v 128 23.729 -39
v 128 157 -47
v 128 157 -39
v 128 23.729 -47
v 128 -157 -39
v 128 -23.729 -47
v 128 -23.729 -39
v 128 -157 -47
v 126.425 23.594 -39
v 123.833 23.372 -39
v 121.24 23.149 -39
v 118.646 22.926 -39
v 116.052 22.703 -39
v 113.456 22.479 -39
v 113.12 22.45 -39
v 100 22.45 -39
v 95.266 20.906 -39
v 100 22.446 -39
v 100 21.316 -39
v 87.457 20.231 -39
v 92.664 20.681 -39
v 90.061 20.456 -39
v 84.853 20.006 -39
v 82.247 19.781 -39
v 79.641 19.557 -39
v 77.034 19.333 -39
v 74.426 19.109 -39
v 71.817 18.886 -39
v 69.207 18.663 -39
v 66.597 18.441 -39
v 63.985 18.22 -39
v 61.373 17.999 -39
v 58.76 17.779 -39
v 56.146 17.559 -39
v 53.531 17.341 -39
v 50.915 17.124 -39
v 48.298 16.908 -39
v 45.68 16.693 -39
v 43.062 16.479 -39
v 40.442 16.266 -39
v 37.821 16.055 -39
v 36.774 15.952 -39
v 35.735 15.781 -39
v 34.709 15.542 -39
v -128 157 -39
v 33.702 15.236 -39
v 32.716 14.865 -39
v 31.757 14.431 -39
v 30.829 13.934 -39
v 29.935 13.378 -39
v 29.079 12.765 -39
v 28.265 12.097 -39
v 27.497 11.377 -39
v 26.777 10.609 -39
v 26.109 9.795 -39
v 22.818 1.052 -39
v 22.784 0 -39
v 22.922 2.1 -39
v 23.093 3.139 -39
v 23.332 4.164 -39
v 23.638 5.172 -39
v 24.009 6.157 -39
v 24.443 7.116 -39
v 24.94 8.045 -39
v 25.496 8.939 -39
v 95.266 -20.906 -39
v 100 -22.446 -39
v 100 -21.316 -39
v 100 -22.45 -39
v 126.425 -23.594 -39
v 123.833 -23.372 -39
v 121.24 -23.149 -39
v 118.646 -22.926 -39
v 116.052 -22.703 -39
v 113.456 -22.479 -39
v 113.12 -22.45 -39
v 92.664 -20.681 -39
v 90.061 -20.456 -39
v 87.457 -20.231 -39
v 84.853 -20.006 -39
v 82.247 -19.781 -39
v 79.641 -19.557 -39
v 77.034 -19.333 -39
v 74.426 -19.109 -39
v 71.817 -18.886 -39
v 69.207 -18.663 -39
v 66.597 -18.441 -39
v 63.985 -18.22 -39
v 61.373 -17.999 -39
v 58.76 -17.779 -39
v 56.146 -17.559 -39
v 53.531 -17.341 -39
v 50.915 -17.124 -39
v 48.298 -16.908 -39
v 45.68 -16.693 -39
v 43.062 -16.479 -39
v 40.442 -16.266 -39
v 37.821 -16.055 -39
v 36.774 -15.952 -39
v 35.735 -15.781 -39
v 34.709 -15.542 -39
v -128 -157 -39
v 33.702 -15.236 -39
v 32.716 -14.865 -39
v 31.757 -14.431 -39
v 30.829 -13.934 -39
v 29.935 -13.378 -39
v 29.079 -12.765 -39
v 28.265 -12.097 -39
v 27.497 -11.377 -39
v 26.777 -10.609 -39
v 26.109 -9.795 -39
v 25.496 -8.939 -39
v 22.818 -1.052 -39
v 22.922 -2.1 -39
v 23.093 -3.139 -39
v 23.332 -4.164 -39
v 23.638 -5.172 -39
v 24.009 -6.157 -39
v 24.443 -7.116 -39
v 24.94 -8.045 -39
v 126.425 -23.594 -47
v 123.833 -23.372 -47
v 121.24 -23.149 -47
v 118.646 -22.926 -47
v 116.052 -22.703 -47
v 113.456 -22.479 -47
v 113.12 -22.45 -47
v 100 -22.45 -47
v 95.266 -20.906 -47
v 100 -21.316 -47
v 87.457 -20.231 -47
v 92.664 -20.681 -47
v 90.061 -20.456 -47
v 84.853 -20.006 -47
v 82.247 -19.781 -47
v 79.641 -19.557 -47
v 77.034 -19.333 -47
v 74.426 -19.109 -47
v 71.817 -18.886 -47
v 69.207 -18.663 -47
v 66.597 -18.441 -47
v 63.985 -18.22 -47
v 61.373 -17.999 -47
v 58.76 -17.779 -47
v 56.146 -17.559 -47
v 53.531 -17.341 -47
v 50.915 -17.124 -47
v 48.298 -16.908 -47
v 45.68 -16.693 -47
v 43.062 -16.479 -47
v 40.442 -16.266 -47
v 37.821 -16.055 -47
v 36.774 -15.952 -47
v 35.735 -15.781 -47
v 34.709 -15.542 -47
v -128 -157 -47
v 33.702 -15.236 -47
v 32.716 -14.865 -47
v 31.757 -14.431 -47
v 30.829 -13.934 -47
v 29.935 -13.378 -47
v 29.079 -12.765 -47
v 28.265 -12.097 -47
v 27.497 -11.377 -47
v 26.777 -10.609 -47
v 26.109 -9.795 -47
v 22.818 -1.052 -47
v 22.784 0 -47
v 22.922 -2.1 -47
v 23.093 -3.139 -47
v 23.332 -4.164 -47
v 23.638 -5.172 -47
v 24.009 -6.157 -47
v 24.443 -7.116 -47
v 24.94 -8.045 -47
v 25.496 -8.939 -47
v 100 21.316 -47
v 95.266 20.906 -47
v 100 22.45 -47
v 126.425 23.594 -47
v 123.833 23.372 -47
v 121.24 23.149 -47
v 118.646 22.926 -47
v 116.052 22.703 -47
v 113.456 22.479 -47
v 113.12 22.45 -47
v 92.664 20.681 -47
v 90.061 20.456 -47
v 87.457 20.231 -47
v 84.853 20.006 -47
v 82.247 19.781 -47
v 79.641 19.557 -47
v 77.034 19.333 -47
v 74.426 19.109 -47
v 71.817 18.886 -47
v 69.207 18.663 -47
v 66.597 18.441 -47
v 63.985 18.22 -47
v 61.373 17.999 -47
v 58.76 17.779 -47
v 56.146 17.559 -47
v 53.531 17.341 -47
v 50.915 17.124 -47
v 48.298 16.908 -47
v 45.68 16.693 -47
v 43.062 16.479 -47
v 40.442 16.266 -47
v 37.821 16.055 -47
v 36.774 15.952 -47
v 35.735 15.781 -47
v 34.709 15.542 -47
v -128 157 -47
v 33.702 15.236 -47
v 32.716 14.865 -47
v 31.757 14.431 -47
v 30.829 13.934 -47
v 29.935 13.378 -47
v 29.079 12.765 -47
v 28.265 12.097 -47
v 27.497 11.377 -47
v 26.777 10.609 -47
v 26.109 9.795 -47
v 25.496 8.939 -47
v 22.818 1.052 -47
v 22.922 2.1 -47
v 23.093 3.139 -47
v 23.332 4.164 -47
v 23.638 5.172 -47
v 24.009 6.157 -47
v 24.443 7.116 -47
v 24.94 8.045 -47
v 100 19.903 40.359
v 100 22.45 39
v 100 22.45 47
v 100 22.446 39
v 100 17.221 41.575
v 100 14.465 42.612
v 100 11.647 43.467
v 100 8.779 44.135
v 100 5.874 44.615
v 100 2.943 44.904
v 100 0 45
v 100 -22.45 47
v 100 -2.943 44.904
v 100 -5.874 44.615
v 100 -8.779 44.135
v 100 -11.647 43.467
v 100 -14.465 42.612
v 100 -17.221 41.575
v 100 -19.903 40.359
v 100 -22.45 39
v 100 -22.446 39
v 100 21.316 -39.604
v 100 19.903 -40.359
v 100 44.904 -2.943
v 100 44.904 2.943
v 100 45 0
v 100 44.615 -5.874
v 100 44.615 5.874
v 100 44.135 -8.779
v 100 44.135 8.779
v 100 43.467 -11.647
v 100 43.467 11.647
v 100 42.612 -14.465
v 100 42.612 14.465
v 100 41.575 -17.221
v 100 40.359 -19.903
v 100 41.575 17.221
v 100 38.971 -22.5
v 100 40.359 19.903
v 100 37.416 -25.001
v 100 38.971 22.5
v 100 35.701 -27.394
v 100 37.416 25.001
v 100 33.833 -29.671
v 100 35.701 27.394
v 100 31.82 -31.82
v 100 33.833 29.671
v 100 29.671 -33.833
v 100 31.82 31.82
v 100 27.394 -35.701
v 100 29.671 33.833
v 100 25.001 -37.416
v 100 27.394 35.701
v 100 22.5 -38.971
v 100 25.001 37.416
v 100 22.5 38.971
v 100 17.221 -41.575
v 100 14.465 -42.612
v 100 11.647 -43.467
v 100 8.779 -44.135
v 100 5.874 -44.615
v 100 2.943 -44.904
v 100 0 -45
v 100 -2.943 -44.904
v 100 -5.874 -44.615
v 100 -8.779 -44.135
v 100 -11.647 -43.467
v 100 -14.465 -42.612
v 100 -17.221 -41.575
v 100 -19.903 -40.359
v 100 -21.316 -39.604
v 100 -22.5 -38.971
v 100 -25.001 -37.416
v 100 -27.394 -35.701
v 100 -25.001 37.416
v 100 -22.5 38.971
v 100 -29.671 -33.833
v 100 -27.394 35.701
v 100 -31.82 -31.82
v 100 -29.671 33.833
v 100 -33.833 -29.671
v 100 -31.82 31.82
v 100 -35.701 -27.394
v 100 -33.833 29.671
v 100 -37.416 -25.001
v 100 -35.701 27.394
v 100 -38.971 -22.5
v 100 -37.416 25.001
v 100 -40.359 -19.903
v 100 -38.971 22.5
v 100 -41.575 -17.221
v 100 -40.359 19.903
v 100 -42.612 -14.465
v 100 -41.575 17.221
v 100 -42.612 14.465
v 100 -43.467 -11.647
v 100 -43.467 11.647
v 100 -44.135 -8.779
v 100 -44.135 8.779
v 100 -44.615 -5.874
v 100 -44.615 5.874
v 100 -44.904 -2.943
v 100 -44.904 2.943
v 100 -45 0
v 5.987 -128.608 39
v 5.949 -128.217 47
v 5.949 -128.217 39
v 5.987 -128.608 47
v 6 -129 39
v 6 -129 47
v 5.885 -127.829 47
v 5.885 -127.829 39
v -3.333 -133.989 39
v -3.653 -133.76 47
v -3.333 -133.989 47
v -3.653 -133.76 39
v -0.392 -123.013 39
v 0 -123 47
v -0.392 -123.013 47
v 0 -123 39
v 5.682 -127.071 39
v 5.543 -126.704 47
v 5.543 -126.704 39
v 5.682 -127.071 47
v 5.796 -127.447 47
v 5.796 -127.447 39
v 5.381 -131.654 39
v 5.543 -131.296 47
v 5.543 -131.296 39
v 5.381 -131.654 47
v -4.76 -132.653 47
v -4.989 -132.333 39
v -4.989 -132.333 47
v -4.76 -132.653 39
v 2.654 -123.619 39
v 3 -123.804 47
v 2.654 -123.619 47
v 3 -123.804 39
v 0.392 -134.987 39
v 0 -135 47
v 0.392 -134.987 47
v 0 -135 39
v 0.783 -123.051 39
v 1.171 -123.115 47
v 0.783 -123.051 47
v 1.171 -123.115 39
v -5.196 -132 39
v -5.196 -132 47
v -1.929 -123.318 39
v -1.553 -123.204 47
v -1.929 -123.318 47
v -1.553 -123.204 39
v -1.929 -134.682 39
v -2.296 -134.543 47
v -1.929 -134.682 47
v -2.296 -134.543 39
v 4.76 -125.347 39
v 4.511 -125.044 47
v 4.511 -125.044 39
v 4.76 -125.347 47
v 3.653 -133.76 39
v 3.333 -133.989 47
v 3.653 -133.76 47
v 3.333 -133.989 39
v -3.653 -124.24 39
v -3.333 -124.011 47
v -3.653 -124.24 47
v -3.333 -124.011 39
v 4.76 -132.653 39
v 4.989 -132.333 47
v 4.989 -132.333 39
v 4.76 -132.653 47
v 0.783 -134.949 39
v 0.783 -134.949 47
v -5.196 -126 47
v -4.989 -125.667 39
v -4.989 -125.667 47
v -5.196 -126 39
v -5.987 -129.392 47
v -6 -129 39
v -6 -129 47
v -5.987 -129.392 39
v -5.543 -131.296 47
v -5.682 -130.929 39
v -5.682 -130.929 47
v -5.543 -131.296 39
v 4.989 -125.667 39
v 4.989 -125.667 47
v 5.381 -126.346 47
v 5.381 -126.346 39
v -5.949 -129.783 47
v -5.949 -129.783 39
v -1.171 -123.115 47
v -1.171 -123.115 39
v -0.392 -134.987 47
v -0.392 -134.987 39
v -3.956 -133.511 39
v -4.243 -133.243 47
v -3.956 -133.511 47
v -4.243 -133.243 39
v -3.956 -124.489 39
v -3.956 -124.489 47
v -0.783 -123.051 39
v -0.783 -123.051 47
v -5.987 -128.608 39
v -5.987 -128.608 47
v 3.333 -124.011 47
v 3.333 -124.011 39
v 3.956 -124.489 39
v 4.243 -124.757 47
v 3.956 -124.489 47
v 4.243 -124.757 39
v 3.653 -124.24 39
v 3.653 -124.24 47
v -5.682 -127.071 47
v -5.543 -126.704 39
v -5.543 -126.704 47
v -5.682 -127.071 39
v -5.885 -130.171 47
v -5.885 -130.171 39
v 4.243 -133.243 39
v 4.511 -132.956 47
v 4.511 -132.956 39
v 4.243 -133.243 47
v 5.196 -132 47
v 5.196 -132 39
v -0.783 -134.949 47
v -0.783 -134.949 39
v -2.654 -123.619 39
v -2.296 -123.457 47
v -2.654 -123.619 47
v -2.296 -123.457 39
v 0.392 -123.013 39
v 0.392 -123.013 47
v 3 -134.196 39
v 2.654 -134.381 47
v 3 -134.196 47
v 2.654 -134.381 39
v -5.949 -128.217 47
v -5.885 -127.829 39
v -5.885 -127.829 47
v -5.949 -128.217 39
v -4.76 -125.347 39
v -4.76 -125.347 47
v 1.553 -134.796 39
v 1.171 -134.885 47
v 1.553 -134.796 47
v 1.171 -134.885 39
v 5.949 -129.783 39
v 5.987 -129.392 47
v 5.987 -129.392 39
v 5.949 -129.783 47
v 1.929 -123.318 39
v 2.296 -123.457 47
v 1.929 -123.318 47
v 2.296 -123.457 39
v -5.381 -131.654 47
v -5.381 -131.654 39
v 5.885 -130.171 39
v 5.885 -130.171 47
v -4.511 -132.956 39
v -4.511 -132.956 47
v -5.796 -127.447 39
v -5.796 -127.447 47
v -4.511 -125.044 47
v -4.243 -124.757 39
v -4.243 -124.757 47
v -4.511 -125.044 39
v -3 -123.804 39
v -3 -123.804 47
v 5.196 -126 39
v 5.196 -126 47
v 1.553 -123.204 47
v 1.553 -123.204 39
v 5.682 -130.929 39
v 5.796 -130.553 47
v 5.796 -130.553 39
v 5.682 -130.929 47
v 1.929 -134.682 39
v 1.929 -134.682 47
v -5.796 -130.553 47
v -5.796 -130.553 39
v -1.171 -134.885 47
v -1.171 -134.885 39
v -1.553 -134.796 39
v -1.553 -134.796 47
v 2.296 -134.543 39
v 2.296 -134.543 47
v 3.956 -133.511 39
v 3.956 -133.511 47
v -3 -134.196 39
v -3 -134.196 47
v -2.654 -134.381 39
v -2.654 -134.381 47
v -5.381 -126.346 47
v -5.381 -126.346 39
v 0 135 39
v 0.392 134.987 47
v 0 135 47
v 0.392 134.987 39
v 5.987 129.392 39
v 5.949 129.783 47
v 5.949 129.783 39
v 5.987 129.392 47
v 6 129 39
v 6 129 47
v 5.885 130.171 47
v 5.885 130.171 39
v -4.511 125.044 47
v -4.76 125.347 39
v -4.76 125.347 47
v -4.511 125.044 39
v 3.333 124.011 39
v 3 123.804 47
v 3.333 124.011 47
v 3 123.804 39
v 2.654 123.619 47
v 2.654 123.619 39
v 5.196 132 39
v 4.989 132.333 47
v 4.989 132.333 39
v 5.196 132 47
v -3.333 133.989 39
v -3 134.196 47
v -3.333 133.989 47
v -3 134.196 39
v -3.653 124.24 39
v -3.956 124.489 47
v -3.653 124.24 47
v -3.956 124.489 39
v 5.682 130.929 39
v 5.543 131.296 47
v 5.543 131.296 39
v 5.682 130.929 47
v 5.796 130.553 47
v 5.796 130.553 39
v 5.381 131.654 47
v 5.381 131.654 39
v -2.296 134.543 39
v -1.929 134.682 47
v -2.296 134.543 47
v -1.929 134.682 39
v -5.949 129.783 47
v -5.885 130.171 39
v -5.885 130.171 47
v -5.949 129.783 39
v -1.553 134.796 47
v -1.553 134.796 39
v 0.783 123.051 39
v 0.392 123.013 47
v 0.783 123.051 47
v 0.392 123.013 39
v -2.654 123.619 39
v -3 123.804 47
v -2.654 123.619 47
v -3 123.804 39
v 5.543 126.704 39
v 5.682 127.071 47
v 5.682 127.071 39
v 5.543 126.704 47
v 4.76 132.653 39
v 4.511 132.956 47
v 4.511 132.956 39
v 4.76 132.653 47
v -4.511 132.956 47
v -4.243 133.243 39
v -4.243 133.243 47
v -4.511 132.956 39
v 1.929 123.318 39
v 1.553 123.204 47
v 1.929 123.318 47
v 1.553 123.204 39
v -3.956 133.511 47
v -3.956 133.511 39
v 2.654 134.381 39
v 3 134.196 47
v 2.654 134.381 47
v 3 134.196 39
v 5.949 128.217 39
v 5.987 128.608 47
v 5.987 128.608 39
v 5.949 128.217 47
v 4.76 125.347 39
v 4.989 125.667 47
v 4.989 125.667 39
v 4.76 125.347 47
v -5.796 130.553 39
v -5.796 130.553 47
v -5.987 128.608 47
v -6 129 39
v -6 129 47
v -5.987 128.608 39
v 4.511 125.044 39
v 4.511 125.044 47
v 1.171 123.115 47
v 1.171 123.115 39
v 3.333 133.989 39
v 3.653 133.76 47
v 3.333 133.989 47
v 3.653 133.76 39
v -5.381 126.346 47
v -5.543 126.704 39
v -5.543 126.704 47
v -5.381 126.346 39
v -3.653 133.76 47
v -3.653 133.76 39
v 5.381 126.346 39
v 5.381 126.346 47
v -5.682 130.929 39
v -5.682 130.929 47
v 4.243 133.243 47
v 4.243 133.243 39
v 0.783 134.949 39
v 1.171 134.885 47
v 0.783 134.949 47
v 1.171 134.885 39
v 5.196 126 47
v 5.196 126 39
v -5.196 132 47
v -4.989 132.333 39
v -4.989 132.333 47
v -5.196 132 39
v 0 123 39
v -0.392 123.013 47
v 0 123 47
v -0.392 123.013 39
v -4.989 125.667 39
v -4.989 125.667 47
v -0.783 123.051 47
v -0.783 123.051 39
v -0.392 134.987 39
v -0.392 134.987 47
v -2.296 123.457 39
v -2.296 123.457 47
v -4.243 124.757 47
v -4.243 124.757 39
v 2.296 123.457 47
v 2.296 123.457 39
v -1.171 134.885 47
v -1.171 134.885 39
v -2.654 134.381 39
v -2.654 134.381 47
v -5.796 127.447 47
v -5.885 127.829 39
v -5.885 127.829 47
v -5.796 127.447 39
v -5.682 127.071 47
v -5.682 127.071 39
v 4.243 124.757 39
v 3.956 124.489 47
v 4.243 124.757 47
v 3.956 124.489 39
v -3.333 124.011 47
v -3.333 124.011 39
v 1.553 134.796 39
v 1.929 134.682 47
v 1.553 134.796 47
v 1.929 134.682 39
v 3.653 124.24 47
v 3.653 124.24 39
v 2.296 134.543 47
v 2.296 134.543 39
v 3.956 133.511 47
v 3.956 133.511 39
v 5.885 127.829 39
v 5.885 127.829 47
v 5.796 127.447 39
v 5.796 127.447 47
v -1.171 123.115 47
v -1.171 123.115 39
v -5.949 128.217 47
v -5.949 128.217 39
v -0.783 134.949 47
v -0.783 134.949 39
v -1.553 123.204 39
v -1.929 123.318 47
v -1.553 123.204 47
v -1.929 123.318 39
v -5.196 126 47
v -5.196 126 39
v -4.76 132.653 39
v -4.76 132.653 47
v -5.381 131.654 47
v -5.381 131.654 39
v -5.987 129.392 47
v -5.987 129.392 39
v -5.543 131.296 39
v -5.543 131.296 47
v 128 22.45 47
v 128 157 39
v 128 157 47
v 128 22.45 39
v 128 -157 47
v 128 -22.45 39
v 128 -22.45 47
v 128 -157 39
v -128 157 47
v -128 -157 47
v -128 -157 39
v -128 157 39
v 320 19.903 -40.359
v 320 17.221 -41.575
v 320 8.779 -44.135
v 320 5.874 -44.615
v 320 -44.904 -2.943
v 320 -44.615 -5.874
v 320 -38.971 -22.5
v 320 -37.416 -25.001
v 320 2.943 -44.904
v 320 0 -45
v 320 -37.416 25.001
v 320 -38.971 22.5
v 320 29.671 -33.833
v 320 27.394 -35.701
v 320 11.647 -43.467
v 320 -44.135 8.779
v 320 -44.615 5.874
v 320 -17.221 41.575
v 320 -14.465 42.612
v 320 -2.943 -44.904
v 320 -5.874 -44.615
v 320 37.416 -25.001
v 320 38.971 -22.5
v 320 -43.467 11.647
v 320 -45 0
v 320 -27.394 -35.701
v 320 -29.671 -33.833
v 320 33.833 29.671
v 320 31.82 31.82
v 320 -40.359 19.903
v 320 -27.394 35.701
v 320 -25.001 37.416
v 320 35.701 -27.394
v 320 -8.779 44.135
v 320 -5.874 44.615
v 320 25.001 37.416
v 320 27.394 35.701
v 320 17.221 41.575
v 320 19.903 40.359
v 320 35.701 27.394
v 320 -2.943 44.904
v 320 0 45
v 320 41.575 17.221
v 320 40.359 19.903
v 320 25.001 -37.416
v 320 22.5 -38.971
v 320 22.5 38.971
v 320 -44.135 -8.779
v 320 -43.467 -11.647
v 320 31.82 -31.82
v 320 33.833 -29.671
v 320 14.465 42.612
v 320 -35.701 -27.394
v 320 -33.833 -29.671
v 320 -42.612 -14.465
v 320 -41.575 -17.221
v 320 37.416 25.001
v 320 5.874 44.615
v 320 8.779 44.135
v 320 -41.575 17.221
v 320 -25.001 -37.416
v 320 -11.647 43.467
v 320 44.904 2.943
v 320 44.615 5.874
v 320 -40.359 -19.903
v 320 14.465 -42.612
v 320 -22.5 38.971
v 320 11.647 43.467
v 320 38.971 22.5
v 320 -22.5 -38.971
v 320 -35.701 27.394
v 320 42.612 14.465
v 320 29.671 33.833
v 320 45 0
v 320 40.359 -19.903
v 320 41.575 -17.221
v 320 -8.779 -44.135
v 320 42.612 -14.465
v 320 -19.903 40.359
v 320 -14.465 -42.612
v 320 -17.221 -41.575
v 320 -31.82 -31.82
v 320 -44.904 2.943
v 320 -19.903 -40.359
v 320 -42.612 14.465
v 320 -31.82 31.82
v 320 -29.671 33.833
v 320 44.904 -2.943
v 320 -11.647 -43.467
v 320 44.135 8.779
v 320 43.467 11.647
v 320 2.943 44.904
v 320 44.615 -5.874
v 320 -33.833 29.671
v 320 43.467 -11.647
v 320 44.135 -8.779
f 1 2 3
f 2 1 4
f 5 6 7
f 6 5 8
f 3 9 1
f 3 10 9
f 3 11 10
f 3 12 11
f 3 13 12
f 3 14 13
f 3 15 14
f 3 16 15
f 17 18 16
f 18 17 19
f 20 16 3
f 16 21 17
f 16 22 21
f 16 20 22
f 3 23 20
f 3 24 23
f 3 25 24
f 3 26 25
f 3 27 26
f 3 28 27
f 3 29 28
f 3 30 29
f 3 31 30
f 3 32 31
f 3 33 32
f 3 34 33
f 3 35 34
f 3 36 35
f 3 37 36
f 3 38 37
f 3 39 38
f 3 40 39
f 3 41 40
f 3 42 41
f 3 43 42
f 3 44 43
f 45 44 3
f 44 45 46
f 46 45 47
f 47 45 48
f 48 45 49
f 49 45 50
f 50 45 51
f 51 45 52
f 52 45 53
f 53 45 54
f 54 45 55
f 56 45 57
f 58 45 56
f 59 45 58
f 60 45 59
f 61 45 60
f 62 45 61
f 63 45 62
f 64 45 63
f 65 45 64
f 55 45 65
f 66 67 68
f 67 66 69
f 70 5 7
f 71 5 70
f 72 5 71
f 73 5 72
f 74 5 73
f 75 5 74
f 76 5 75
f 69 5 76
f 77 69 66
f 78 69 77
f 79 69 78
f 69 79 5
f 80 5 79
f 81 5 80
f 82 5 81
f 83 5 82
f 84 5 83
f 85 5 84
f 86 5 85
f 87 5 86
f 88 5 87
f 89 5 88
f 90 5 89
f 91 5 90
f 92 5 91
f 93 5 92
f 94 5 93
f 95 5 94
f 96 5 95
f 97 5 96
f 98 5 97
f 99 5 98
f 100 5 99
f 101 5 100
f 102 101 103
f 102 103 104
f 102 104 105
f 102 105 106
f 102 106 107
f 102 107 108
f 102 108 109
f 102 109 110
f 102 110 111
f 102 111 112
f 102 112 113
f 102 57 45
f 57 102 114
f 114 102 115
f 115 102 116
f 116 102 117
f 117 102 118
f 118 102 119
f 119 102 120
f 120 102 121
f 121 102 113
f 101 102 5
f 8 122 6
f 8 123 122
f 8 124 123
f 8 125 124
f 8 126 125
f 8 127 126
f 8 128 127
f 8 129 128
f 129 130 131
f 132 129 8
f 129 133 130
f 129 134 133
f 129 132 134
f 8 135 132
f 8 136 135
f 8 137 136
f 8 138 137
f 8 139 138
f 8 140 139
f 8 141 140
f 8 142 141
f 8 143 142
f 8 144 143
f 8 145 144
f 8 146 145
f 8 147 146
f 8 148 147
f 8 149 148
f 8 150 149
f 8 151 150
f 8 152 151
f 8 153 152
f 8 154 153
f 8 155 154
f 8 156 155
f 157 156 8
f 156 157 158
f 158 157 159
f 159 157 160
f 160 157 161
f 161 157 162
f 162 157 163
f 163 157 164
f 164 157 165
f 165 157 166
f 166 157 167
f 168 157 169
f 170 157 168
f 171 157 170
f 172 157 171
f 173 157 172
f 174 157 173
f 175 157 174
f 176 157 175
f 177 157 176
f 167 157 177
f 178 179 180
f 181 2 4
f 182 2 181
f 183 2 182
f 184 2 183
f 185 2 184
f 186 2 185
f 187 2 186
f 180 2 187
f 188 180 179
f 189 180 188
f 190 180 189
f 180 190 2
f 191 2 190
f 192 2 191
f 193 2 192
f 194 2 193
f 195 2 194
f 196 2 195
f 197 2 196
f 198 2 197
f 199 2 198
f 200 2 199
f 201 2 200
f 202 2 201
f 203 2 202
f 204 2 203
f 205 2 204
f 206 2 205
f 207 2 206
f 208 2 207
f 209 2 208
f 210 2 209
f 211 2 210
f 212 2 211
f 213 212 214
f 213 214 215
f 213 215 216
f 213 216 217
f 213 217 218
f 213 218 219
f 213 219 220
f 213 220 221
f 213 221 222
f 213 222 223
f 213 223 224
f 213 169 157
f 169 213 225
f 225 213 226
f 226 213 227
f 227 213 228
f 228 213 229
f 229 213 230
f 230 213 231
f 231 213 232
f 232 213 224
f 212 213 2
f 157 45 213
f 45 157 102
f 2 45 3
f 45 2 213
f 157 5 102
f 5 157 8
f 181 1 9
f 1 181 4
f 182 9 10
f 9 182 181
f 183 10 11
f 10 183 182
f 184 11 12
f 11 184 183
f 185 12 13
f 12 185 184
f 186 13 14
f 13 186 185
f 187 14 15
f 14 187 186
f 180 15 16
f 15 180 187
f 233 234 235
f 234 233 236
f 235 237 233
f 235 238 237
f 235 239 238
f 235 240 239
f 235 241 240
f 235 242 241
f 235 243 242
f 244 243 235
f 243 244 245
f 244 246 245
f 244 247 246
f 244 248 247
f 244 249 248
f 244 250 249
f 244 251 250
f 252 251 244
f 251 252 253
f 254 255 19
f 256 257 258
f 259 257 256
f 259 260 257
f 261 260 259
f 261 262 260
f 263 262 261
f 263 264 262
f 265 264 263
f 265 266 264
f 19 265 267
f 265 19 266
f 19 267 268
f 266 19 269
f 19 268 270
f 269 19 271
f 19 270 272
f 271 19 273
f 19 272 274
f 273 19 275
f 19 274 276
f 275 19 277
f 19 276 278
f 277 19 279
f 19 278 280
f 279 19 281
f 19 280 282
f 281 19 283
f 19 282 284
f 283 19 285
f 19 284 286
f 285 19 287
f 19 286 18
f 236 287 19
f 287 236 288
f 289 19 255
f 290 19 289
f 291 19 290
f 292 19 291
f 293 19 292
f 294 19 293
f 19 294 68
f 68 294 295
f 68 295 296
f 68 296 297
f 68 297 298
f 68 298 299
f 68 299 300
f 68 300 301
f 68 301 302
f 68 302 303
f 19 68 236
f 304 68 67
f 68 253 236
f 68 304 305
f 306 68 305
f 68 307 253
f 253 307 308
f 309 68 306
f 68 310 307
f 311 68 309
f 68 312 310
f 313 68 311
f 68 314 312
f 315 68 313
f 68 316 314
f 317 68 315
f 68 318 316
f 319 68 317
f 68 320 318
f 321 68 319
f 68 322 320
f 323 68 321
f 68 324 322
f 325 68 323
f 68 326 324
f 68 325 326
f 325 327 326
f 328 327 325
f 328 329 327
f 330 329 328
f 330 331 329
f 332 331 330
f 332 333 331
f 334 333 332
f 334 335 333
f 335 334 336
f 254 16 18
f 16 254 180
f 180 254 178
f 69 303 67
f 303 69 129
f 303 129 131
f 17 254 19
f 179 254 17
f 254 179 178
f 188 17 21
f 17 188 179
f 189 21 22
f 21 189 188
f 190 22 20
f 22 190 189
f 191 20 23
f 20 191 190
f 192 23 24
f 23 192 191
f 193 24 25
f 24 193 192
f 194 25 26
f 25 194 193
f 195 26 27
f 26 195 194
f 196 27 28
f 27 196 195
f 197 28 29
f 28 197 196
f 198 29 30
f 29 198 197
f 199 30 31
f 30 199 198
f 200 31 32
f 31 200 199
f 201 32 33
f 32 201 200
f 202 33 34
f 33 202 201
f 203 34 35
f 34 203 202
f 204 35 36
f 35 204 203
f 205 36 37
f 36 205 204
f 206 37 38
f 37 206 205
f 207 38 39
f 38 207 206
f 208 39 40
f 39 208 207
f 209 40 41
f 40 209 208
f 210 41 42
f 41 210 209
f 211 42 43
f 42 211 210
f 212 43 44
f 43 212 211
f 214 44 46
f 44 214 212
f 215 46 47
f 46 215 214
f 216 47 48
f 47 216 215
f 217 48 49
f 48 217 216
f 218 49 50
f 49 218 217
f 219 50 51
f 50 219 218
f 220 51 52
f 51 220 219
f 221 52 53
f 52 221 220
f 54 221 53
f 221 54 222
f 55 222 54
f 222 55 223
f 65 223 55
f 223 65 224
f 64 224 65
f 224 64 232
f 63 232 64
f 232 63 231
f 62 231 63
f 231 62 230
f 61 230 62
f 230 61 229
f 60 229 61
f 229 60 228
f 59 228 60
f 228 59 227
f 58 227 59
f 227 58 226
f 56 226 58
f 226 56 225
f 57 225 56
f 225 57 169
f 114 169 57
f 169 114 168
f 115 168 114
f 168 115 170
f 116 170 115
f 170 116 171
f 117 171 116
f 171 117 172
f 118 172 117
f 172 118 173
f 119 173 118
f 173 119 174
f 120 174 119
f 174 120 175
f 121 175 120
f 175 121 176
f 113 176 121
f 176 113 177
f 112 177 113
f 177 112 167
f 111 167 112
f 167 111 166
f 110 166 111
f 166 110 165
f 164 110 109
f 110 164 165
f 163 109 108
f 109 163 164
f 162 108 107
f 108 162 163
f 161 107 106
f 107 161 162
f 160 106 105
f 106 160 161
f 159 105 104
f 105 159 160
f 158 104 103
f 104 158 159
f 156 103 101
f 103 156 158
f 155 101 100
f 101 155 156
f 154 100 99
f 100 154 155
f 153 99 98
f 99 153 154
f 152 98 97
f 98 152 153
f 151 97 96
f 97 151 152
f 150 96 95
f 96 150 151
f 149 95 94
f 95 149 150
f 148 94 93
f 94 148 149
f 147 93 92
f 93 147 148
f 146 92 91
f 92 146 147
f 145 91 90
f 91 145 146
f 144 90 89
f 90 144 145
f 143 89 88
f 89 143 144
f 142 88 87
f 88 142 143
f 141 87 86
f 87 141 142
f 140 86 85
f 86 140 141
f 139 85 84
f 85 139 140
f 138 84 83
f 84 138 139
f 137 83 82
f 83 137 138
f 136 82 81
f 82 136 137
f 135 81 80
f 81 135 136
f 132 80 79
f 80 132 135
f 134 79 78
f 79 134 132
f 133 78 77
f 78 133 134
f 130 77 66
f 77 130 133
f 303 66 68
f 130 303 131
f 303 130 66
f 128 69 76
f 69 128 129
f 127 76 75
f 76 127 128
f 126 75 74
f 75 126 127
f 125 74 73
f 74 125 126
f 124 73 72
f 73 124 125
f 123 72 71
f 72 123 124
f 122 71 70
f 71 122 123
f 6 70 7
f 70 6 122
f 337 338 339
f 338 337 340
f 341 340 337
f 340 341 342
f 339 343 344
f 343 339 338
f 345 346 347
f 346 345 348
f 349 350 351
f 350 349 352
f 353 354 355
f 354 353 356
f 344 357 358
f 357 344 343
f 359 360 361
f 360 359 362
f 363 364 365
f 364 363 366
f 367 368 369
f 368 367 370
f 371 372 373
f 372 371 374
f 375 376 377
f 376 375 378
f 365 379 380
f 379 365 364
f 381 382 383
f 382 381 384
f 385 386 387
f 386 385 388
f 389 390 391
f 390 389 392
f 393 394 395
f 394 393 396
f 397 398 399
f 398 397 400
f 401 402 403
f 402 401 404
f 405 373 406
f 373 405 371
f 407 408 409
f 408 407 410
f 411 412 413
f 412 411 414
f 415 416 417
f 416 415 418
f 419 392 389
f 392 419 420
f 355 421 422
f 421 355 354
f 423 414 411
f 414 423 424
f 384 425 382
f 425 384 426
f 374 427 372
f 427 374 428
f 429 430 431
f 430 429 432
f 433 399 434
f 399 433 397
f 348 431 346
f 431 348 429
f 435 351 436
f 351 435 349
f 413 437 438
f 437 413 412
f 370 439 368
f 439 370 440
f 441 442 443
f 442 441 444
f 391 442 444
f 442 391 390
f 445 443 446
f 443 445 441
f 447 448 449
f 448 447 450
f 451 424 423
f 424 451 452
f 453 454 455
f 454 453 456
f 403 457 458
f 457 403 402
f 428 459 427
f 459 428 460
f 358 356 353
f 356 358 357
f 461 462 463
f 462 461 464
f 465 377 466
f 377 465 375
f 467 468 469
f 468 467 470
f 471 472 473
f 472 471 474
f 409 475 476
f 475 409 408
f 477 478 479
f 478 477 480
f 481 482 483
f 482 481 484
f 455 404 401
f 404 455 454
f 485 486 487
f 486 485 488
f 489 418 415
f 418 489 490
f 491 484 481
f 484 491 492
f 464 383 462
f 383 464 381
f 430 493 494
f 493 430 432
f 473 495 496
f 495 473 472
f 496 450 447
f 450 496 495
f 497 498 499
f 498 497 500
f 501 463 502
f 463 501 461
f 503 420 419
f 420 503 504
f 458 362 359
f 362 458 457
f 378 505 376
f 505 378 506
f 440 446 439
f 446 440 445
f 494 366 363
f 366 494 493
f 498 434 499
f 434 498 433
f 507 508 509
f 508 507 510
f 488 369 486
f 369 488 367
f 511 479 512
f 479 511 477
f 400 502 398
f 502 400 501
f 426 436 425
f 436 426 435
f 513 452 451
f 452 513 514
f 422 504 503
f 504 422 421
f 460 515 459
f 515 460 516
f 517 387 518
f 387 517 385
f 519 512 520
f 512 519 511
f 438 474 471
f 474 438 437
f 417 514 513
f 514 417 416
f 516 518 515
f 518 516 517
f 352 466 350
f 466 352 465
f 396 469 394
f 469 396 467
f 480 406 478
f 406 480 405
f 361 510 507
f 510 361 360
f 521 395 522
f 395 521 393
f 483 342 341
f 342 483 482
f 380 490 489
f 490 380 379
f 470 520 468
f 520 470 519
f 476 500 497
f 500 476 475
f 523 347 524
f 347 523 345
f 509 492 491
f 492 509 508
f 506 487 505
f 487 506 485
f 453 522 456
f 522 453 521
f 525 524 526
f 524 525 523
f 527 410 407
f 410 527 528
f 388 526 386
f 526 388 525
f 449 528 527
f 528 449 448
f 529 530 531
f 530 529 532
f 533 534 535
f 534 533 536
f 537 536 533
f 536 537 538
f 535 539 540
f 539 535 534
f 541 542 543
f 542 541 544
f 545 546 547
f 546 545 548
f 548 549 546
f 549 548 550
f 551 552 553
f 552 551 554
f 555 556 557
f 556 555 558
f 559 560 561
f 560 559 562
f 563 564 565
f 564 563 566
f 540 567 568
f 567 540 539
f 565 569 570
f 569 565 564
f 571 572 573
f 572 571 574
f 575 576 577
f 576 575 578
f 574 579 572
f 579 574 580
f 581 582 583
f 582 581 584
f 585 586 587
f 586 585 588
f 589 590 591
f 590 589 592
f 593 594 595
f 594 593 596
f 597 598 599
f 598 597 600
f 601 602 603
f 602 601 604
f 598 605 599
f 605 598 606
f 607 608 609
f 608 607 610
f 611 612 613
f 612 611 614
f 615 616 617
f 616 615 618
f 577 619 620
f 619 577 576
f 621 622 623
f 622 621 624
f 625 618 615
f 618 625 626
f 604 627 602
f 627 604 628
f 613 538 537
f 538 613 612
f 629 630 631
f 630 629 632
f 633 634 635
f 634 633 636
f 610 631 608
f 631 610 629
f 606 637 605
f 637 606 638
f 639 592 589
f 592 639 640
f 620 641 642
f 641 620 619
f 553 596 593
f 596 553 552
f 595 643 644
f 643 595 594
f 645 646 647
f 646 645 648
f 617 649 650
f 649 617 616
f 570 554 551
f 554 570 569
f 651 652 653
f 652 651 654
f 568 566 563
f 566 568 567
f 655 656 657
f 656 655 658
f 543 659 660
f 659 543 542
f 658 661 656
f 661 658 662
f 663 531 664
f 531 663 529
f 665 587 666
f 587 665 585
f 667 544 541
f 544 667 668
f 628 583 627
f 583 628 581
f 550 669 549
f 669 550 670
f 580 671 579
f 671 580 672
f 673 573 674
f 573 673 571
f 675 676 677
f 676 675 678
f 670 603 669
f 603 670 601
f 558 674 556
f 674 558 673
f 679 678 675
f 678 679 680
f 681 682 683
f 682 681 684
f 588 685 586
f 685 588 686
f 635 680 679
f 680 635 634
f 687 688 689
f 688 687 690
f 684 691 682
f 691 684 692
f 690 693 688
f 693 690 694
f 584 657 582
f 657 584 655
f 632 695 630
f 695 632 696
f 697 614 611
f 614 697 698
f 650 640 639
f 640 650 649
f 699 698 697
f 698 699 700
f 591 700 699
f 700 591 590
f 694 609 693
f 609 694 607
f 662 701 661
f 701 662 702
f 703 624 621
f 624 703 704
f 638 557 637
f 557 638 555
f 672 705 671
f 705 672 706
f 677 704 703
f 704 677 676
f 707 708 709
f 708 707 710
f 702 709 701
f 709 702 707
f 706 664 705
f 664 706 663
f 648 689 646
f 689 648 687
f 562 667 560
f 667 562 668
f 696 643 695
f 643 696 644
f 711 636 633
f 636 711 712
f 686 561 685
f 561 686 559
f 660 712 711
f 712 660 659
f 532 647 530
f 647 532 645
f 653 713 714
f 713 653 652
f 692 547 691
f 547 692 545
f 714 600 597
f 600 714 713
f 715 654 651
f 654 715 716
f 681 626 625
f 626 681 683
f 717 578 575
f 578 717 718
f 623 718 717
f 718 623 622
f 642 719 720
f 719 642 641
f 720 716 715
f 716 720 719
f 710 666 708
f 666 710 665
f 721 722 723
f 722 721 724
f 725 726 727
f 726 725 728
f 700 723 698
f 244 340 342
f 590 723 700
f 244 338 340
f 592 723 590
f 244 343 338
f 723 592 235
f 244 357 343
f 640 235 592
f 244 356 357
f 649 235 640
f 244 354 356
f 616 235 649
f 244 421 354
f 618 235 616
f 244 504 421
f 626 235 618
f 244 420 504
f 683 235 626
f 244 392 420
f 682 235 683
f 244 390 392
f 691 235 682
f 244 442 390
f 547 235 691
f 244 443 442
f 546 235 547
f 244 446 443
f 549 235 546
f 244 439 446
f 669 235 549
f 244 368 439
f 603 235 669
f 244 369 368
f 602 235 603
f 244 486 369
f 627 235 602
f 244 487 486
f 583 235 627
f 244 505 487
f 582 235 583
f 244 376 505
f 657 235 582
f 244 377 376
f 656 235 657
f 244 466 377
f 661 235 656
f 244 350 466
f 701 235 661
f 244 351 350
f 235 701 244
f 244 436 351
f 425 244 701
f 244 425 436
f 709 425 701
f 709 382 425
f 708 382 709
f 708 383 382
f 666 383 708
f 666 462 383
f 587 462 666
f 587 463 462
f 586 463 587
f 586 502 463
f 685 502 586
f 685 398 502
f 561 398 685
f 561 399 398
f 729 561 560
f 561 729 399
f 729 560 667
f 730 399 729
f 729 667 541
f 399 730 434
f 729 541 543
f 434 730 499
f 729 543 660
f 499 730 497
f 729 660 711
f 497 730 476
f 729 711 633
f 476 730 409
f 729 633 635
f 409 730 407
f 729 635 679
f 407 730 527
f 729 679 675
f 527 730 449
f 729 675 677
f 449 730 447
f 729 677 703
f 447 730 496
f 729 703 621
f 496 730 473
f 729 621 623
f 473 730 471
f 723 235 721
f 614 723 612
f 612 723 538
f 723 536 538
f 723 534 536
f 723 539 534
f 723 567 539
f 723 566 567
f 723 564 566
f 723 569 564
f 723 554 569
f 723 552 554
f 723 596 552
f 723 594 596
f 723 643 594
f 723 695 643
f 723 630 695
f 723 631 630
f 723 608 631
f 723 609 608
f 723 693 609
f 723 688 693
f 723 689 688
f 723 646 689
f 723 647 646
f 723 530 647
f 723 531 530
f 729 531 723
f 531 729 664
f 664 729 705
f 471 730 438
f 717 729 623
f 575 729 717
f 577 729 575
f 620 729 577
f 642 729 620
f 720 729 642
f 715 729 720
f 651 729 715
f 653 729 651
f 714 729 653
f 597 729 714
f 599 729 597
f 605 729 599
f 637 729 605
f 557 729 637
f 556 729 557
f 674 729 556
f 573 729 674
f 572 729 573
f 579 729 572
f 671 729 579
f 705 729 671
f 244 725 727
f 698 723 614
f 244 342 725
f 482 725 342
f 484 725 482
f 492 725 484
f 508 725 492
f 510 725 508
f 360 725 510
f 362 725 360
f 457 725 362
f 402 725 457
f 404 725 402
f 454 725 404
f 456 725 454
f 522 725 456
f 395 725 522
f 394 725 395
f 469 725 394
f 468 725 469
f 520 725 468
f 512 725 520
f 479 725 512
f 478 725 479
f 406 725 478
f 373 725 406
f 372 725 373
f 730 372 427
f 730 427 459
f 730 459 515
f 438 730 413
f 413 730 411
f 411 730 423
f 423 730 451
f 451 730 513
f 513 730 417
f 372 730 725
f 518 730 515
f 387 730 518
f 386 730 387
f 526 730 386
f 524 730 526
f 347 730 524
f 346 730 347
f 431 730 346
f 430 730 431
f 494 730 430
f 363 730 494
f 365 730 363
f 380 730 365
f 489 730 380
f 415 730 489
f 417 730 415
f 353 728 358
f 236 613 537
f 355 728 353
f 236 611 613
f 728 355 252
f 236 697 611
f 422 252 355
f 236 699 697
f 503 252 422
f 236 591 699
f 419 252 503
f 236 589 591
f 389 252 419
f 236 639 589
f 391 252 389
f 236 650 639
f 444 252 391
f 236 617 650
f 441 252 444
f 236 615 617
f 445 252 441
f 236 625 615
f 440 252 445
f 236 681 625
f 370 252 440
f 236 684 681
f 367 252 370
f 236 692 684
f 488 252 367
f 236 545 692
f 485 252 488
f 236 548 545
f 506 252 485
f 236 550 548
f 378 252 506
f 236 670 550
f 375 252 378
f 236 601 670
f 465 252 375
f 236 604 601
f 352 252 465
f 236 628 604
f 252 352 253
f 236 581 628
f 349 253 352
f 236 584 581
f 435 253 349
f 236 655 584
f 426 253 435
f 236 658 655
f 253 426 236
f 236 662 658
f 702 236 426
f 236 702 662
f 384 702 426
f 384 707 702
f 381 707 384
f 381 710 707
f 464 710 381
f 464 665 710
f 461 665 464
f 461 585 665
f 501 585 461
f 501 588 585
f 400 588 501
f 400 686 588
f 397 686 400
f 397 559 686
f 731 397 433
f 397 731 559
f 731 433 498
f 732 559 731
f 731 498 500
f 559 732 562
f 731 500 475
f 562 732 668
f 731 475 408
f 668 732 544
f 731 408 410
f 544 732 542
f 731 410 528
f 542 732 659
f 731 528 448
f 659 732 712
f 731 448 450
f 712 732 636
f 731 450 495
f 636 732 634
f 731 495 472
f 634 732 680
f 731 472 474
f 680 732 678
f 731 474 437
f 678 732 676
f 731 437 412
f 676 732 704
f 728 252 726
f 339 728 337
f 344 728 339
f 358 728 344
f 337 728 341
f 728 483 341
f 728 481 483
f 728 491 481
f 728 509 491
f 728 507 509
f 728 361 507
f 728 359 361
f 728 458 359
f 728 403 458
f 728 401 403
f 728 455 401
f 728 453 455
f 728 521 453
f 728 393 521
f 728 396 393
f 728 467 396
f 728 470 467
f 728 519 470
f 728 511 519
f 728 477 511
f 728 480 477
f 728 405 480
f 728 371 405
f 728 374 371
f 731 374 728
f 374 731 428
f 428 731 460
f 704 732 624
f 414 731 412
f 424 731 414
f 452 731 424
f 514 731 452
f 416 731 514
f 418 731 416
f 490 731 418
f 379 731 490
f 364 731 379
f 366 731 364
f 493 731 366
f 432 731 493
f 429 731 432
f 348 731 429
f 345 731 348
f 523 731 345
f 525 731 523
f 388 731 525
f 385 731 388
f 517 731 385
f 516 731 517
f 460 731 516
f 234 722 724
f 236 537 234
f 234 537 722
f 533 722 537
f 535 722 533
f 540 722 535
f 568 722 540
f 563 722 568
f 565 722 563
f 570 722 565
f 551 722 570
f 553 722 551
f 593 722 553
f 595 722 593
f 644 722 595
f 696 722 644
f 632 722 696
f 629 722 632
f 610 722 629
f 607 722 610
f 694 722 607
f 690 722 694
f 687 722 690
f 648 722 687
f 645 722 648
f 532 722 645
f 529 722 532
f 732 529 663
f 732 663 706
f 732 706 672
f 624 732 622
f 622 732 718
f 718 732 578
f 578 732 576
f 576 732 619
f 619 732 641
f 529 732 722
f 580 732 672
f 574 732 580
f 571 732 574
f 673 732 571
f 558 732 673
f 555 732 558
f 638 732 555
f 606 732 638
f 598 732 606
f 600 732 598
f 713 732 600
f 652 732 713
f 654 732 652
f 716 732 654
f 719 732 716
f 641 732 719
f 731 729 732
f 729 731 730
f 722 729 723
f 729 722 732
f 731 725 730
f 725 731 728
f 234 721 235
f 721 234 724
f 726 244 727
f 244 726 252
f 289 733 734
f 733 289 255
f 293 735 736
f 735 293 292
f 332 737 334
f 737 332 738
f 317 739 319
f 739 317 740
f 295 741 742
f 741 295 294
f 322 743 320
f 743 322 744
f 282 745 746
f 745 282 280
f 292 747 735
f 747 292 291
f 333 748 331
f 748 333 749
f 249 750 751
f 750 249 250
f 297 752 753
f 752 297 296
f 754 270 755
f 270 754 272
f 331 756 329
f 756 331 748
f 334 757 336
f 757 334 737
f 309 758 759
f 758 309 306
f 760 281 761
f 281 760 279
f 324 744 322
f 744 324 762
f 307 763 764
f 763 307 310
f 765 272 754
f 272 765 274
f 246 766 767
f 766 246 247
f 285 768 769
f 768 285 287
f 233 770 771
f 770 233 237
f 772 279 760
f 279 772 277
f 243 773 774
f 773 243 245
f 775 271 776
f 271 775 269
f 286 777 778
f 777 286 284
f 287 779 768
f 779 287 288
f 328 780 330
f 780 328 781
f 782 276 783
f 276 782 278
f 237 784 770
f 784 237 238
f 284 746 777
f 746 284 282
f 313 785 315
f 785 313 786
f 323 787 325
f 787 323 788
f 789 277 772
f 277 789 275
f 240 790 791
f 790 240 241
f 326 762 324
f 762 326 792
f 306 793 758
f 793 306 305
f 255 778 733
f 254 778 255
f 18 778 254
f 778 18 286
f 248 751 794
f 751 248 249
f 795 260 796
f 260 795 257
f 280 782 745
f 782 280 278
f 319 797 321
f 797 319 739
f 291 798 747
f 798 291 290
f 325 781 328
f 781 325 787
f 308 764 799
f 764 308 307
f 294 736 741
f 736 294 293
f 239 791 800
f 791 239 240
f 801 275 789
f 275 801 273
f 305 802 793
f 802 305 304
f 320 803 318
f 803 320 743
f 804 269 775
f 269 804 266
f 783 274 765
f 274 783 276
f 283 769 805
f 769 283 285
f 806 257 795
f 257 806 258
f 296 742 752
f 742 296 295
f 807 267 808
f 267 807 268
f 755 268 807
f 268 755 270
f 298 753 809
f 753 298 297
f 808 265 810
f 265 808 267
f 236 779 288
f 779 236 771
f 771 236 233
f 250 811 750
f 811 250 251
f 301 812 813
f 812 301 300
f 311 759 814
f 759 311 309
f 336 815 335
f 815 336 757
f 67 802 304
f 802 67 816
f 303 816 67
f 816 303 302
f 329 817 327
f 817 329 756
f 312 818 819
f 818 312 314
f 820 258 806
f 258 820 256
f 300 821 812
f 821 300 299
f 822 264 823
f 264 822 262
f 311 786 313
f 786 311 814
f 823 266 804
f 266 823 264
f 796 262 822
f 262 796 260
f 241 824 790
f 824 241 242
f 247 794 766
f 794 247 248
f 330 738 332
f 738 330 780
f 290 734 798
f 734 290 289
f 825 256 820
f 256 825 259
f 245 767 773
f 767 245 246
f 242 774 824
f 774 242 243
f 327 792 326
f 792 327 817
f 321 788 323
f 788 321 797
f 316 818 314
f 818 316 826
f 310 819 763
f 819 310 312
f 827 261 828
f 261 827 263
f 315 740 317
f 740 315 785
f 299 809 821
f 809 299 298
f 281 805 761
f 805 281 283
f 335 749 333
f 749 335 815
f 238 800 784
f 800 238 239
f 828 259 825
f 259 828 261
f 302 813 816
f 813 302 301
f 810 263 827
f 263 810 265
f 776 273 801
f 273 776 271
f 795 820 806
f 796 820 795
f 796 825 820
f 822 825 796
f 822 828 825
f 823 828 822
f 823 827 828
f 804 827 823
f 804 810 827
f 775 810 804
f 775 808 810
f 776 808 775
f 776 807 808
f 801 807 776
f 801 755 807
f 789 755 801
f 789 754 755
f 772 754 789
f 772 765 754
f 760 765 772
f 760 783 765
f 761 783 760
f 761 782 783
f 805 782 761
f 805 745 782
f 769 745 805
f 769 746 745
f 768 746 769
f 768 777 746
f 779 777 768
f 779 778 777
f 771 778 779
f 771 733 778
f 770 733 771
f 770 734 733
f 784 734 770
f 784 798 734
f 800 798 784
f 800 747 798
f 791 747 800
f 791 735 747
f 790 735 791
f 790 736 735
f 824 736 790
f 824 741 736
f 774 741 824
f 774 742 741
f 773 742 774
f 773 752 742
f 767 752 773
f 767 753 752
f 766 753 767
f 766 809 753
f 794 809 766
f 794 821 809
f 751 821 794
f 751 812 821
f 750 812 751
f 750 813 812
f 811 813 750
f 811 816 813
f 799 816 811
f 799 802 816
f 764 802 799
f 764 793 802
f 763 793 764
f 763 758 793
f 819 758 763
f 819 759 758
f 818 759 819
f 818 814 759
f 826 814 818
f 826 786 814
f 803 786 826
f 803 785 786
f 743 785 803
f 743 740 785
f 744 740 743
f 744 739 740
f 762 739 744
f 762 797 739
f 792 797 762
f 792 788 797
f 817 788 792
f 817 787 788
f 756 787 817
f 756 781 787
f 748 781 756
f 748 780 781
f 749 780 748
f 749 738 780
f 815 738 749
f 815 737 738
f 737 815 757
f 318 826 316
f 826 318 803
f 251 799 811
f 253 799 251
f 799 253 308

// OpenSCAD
// PROVISIONAL simulation geometry only; not manufacturing CAD.
// Resolves the measured low-energy post-nip lower-plate interference without
// changing wheel, nip, motor, hub, pitch, or calibrated ball parameters.
$fn = 96;

part = "assembly"; // [assembly,lower,upper,cutout]

panel_x = 256;
panel_y = 314;
panel_t = 8;
panel_z = 43;
shaft_y = 129;
shaft_hole_d = 12;

// Frozen accepted wheel-exit state, launcher-local SI values converted below.
release_x = 38.8738059257;
release_z = -4.57450083064;
release_vx = 5269.52537961;
release_vz = -196.876959017;
gravity_x = -3351.79740459;
gravity_z = -9208.98768370;
ball_swept_r = 38; // 33 mm ball radius + 5 mm practical clearance.
sample_dt = 0.0005;
sample_count = 140;

// Explicit analysis-only CAD corridor from launcher-envelope.scad.
cad_corridor_x0 = 100;
cad_corridor_x1 = 320;
cad_corridor_r = 45;
lower_inner_z = -39;
cad_plate_half_width = sqrt(cad_corridor_r * cad_corridor_r
                            - lower_inner_z * lower_inner_z);

function path_x(i) = release_x + release_vx * (i * sample_dt)
                   + 0.5 * gravity_x * pow(i * sample_dt, 2);
function path_z(i) = release_z + release_vz * (i * sample_dt)
                   + 0.5 * gravity_z * pow(i * sample_dt, 2);
function plate_cross_r(i) =
    let(distance = path_z(i) - lower_inner_z)
    distance >= 0 && distance < ball_swept_r
        ? sqrt(ball_swept_r * ball_swept_r - distance * distance)
        : 0;

module measured_lower_swept_cutout_2d() {
    union()
        for (i = [0:sample_count - 1])
            if (plate_cross_r(i) > 0 && plate_cross_r(i + 1) > 0)
                hull() {
                    translate([path_x(i), 0]) circle(r=plate_cross_r(i));
                    translate([path_x(i + 1), 0]) circle(r=plate_cross_r(i + 1));
                }
}

module cad_corridor_plate_cutout_2d() {
    translate([(cad_corridor_x0 + cad_corridor_x1) / 2, 0])
        square([cad_corridor_x1 - cad_corridor_x0,
                2 * cad_plate_half_width], center=true);
}

module practical_lower_cutout_2d() {
    union() {
        measured_lower_swept_cutout_2d();
        cad_corridor_plate_cutout_2d();
    }
}

module lower_panel() {
    difference() {
        cube([panel_x, panel_y, panel_t], center=true);
        linear_extrude(height=panel_t + 2, center=true)
            practical_lower_cutout_2d();
    }
}

module upper_panel() {
    difference() {
        cube([panel_x, panel_y, panel_t], center=true);
        for (y = [-shaft_y, shaft_y])
            translate([0, y, 0]) cylinder(d=shaft_hole_d, h=panel_t + 2, center=true);
        linear_extrude(height=panel_t + 2, center=true)
            cad_corridor_plate_cutout_2d();
    }
}

module assembly() {
    color([0.35, 0.40, 0.46]) translate([0, 0, -panel_z]) lower_panel();
    color([0.35, 0.40, 0.46]) translate([0, 0, panel_z]) upper_panel();
    color("steelblue", 0.20)
        translate([(cad_corridor_x0 + cad_corridor_x1) / 2, 0, 0])
            rotate([0, 90, 0])
                cylinder(r=cad_corridor_r,
                         h=cad_corridor_x1 - cad_corridor_x0, center=true);
}

if (part == "lower") lower_panel();
else if (part == "upper") upper_panel();
else if (part == "cutout")
    linear_extrude(height=panel_t, center=true) practical_lower_cutout_2d();
else assembly();
